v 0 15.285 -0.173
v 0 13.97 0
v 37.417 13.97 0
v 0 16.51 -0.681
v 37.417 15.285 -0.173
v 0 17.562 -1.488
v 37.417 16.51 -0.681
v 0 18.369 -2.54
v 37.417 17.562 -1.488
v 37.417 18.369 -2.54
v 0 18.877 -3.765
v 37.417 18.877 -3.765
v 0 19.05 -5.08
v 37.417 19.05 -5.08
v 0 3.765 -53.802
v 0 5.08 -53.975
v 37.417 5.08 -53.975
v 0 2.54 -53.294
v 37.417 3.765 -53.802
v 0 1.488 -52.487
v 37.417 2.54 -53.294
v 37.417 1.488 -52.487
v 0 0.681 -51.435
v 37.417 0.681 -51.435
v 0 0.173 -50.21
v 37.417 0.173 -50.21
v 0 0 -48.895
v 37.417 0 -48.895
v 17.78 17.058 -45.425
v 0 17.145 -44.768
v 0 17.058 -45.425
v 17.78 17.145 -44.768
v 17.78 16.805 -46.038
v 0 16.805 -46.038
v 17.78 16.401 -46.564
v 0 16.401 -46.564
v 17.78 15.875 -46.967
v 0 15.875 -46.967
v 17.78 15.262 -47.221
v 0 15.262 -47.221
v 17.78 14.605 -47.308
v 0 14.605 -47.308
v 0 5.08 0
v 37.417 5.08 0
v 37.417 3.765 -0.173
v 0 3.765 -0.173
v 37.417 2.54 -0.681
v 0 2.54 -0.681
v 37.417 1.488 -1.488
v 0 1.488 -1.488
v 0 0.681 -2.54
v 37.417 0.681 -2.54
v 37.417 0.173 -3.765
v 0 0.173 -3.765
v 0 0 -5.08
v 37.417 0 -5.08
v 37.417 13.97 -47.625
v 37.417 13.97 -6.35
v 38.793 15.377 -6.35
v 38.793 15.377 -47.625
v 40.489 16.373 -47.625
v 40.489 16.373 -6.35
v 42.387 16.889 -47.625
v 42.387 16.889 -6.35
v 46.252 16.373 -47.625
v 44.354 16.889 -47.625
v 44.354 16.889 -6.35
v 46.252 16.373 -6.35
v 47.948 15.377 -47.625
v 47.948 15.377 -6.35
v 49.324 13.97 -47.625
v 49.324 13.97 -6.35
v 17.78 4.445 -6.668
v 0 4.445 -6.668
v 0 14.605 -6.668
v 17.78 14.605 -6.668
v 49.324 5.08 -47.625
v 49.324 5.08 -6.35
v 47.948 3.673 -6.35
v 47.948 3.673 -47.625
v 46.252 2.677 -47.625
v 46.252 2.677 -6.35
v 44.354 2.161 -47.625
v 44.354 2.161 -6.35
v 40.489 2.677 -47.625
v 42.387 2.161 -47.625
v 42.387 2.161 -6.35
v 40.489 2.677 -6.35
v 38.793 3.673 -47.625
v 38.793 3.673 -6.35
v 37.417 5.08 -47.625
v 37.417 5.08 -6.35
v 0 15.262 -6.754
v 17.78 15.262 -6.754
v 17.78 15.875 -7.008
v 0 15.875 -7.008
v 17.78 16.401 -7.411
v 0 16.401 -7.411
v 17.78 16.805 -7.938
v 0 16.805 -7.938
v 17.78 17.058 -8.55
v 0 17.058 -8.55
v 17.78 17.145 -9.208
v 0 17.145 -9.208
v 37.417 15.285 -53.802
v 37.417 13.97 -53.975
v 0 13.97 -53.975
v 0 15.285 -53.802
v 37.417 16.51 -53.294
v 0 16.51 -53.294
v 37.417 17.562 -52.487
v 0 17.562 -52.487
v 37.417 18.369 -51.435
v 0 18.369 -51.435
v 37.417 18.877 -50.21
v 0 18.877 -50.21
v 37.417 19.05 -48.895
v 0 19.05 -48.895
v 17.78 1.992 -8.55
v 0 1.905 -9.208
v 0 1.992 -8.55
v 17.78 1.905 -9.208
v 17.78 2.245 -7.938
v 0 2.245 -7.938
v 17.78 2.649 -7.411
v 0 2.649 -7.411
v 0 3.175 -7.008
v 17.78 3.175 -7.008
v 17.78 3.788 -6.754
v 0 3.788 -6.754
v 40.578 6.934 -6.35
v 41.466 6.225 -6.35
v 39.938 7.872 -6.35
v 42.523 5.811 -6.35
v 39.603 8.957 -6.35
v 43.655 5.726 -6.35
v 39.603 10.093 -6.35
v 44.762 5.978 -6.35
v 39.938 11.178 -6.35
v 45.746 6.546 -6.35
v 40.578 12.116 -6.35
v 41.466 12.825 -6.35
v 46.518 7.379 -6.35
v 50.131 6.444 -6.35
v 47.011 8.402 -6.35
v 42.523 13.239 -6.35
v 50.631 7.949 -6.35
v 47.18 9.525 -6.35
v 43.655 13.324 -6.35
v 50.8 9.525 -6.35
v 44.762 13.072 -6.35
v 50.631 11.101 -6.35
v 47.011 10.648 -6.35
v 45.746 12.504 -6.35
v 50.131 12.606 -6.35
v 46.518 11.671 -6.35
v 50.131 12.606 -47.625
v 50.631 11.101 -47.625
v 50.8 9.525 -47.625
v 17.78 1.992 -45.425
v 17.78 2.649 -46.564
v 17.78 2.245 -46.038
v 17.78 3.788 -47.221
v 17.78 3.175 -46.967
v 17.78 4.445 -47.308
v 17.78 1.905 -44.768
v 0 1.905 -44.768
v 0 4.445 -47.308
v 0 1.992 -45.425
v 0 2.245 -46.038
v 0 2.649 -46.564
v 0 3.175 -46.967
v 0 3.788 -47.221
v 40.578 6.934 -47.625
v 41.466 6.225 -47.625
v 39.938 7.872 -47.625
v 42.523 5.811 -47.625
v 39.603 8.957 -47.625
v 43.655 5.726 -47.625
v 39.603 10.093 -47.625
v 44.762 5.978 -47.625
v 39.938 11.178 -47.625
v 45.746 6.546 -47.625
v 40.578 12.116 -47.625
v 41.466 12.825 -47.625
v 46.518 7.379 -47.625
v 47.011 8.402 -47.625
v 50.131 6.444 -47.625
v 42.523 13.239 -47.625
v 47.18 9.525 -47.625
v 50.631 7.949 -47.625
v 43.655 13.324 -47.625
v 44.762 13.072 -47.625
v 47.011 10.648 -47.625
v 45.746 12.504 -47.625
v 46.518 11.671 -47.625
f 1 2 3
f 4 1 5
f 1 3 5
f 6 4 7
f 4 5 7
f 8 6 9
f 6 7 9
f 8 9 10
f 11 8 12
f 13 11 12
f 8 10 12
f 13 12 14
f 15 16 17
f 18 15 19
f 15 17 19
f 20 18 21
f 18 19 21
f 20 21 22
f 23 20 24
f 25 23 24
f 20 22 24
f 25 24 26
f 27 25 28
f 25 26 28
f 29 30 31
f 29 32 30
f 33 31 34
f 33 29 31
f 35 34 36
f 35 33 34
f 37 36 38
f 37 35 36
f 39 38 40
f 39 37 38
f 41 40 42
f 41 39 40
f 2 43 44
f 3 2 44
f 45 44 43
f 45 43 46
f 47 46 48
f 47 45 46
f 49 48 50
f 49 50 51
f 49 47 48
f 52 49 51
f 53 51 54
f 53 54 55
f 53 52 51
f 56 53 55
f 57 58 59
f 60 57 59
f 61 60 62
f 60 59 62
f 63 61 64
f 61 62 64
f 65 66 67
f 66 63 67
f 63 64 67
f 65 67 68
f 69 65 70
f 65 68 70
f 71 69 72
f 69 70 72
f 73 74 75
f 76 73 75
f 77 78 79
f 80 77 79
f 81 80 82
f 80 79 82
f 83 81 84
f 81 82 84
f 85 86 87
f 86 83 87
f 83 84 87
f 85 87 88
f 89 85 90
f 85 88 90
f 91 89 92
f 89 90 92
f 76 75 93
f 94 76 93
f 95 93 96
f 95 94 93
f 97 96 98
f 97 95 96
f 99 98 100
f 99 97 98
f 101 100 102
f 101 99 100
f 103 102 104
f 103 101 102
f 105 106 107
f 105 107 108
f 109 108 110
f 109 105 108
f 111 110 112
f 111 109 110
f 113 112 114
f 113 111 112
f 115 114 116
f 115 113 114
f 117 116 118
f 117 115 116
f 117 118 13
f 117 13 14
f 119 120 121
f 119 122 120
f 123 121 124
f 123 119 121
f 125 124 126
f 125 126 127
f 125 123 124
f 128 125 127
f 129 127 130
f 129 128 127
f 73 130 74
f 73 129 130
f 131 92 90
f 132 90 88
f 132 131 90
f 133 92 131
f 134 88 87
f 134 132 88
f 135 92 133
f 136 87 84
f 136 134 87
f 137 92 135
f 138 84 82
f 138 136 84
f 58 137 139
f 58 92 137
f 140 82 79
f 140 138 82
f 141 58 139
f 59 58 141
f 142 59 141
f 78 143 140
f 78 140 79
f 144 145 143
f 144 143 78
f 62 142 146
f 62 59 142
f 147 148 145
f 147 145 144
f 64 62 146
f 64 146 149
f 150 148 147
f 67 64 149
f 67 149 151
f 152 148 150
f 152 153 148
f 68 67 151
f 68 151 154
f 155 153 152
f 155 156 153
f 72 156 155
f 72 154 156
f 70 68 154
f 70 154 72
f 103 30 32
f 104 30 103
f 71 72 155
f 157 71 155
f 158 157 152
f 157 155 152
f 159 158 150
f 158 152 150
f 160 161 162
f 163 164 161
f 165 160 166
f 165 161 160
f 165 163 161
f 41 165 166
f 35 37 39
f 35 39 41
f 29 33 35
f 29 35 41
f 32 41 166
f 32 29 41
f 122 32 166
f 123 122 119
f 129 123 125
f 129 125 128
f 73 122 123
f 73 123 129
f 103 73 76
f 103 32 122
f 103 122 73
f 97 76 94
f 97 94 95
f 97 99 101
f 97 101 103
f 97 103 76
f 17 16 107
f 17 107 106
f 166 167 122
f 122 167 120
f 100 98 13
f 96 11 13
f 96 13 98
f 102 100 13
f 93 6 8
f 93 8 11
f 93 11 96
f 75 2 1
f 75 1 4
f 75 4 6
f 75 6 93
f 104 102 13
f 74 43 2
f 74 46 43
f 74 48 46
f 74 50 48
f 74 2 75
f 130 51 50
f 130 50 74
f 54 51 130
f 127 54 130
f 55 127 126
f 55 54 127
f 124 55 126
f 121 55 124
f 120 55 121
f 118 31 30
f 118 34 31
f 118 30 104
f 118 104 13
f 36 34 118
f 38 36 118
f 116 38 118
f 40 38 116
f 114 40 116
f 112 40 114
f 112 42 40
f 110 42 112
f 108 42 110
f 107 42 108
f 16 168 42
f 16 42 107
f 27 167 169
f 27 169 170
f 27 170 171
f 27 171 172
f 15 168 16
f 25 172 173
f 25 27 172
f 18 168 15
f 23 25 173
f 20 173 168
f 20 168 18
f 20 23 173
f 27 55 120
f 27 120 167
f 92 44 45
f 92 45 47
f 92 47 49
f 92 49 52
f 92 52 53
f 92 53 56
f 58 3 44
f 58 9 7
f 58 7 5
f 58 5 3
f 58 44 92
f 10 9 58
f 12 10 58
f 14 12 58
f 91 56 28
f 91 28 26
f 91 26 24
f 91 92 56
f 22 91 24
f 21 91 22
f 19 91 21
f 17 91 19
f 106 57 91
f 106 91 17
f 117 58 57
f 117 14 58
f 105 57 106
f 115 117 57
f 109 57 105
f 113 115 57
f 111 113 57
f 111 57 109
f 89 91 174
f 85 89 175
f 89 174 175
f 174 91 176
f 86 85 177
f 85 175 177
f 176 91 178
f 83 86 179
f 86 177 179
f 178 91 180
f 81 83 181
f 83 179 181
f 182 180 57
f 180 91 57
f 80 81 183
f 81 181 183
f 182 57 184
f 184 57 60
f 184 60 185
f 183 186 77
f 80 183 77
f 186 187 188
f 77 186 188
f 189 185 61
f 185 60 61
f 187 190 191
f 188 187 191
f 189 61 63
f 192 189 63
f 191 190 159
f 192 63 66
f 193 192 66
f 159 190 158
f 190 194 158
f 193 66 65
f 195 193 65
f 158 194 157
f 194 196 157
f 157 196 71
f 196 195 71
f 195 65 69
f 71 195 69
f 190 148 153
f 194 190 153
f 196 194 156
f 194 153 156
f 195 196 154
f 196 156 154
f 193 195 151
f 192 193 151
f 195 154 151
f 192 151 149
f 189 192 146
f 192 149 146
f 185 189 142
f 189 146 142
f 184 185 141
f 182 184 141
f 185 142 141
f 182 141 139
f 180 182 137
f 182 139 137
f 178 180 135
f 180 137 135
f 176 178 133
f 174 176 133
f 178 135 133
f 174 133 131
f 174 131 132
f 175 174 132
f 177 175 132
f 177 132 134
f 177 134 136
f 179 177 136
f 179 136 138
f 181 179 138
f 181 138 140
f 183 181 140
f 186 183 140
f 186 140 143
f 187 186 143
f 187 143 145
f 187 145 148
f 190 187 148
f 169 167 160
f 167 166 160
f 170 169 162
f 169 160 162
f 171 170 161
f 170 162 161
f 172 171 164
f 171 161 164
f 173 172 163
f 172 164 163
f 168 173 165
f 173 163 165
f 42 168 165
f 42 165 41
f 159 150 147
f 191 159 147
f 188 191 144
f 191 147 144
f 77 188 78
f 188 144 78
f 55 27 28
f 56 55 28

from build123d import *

# Parameters (mm, degrees)
SKETCH1_W           = 50.8
SKETCH1_H           = 53.975
BOSS_EXTRUDE1_DEPTH = 19.05
FILLET1_R           = 5.08
CUT_EXTRUDE1_DEPTH  = 54.975
SKETCH3_W           = 14.750075479
SKETCH3_H           = 6.35
SKETCH3_W_2         = 17.214026843
CUT_EXTRUDE2_DEPTH  = 19.05
SKETCH4_R           = 3.81
CUT_EXTRUDE3_DEPTH  = 48.625
SKETCH5_W           = 40.64
SKETCH5_H           = 15.24
CUT_EXTRUDE4_DEPTH  = 17.78
FILLET2_R           = 2.54


with BuildPart() as part:
    # Sketch1 → Boss-Extrude1 (new body)
    with BuildSketch(Plane(origin=(0, 0, 0), x_dir=(1, 0, 0), z_dir=(0, 1, 0))):
        with Locations((25.4, 26.9875)):
            Rectangle(SKETCH1_W, SKETCH1_H)
    extrude(amount=BOSS_EXTRUDE1_DEPTH)

    # Fillet1
    fillet1_edges = [part.edges().sort_by_distance(p)[0] for p in [
        (25.4, 19.05, -53.975),
        (25.4, 0, -53.975),
        (25.4, 0, 0),
        (25.4, 19.05, 0),
    ]]
    fillet(fillet1_edges, radius=FILLET1_R)

    # Sketch2 → Cut-Extrude1 (cut, through all)
    with BuildSketch(Plane.XY):
        with BuildLine():
            Line((50.8, 19.05), (37.417396167, 19.05))
            Line((37.417396167, 19.05), (37.417396167, 13.97))
            ThreePointArc((37.417396167, 13.97), (43.3705, 16.9545), (49.323603833, 13.97))
            Line((49.323603833, 13.97), (50.8, 13.97))
            Line((50.8, 13.97), (50.8, 19.05))
        make_face()
        with BuildLine():
            Line((50.8, 13.97), (49.323603833, 13.97))
            ThreePointArc((49.323603833, 13.97), (50.421246598, 11.866888695), (50.8, 9.525))
            Line((50.8, 9.525), (50.8, 13.97))
        make_face()
        with BuildLine():
            ThreePointArc((50.8, 9.525), (50.421246598, 7.183111305), (49.323603833, 5.08))
            Line((49.323603833, 5.08), (50.8, 5.08))
            Line((50.8, 5.08), (50.8, 9.525))
        make_face()
        with BuildLine():
            ThreePointArc((49.323603833, 5.08), (43.3705, 2.0955), (37.417396167, 5.08))
            Line((37.417396167, 5.08), (37.417396167, 0))
            Line((37.417396167, 0), (50.8, 0))
            Line((50.8, 0), (50.8, 5.08))
            Line((50.8, 5.08), (49.323603833, 5.08))
        make_face()
    extrude(amount=-CUT_EXTRUDE1_DEPTH, mode=Mode.SUBTRACT)

    # Sketch3 → Cut-Extrude2 (cut)
    with BuildSketch(Plane(origin=(0, 19.05, 0), x_dir=(1, 0, 0), z_dir=(0, 1, 0))):
        with Locations((44.792433907, 3.175)):
            Rectangle(SKETCH3_W, SKETCH3_H)
        with Locations((46.024409589, 50.8)):
            Rectangle(SKETCH3_W_2, SKETCH3_H)
    extrude(amount=-CUT_EXTRUDE2_DEPTH, mode=Mode.SUBTRACT)

    # Sketch4 → Cut-Extrude3 (cut, through all)
    with BuildSketch(Plane.XY.offset(-6.35)):
        with Locations((43.3705, 9.525)):
            Circle(SKETCH4_R)
    extrude(amount=-CUT_EXTRUDE3_DEPTH, mode=Mode.SUBTRACT)

    # Sketch5 → Cut-Extrude4 (cut)
    with BuildSketch(Plane.ZY):
        with Locations((-26.9875, 9.525)):
            Rectangle(SKETCH5_W, SKETCH5_H)
    extrude(amount=-CUT_EXTRUDE4_DEPTH, mode=Mode.SUBTRACT)

    # Fillet2
    fillet2_edges = [part.edges().sort_by_distance(p)[0] for p in [
        (8.89, 1.905, -47.3075),
        (8.89, 17.145, -47.3075),
        (8.89, 17.145, -6.6675),
        (8.89, 1.905, -6.6675),
    ]]
    fillet(fillet2_edges, radius=FILLET2_R)


solid = part.part
